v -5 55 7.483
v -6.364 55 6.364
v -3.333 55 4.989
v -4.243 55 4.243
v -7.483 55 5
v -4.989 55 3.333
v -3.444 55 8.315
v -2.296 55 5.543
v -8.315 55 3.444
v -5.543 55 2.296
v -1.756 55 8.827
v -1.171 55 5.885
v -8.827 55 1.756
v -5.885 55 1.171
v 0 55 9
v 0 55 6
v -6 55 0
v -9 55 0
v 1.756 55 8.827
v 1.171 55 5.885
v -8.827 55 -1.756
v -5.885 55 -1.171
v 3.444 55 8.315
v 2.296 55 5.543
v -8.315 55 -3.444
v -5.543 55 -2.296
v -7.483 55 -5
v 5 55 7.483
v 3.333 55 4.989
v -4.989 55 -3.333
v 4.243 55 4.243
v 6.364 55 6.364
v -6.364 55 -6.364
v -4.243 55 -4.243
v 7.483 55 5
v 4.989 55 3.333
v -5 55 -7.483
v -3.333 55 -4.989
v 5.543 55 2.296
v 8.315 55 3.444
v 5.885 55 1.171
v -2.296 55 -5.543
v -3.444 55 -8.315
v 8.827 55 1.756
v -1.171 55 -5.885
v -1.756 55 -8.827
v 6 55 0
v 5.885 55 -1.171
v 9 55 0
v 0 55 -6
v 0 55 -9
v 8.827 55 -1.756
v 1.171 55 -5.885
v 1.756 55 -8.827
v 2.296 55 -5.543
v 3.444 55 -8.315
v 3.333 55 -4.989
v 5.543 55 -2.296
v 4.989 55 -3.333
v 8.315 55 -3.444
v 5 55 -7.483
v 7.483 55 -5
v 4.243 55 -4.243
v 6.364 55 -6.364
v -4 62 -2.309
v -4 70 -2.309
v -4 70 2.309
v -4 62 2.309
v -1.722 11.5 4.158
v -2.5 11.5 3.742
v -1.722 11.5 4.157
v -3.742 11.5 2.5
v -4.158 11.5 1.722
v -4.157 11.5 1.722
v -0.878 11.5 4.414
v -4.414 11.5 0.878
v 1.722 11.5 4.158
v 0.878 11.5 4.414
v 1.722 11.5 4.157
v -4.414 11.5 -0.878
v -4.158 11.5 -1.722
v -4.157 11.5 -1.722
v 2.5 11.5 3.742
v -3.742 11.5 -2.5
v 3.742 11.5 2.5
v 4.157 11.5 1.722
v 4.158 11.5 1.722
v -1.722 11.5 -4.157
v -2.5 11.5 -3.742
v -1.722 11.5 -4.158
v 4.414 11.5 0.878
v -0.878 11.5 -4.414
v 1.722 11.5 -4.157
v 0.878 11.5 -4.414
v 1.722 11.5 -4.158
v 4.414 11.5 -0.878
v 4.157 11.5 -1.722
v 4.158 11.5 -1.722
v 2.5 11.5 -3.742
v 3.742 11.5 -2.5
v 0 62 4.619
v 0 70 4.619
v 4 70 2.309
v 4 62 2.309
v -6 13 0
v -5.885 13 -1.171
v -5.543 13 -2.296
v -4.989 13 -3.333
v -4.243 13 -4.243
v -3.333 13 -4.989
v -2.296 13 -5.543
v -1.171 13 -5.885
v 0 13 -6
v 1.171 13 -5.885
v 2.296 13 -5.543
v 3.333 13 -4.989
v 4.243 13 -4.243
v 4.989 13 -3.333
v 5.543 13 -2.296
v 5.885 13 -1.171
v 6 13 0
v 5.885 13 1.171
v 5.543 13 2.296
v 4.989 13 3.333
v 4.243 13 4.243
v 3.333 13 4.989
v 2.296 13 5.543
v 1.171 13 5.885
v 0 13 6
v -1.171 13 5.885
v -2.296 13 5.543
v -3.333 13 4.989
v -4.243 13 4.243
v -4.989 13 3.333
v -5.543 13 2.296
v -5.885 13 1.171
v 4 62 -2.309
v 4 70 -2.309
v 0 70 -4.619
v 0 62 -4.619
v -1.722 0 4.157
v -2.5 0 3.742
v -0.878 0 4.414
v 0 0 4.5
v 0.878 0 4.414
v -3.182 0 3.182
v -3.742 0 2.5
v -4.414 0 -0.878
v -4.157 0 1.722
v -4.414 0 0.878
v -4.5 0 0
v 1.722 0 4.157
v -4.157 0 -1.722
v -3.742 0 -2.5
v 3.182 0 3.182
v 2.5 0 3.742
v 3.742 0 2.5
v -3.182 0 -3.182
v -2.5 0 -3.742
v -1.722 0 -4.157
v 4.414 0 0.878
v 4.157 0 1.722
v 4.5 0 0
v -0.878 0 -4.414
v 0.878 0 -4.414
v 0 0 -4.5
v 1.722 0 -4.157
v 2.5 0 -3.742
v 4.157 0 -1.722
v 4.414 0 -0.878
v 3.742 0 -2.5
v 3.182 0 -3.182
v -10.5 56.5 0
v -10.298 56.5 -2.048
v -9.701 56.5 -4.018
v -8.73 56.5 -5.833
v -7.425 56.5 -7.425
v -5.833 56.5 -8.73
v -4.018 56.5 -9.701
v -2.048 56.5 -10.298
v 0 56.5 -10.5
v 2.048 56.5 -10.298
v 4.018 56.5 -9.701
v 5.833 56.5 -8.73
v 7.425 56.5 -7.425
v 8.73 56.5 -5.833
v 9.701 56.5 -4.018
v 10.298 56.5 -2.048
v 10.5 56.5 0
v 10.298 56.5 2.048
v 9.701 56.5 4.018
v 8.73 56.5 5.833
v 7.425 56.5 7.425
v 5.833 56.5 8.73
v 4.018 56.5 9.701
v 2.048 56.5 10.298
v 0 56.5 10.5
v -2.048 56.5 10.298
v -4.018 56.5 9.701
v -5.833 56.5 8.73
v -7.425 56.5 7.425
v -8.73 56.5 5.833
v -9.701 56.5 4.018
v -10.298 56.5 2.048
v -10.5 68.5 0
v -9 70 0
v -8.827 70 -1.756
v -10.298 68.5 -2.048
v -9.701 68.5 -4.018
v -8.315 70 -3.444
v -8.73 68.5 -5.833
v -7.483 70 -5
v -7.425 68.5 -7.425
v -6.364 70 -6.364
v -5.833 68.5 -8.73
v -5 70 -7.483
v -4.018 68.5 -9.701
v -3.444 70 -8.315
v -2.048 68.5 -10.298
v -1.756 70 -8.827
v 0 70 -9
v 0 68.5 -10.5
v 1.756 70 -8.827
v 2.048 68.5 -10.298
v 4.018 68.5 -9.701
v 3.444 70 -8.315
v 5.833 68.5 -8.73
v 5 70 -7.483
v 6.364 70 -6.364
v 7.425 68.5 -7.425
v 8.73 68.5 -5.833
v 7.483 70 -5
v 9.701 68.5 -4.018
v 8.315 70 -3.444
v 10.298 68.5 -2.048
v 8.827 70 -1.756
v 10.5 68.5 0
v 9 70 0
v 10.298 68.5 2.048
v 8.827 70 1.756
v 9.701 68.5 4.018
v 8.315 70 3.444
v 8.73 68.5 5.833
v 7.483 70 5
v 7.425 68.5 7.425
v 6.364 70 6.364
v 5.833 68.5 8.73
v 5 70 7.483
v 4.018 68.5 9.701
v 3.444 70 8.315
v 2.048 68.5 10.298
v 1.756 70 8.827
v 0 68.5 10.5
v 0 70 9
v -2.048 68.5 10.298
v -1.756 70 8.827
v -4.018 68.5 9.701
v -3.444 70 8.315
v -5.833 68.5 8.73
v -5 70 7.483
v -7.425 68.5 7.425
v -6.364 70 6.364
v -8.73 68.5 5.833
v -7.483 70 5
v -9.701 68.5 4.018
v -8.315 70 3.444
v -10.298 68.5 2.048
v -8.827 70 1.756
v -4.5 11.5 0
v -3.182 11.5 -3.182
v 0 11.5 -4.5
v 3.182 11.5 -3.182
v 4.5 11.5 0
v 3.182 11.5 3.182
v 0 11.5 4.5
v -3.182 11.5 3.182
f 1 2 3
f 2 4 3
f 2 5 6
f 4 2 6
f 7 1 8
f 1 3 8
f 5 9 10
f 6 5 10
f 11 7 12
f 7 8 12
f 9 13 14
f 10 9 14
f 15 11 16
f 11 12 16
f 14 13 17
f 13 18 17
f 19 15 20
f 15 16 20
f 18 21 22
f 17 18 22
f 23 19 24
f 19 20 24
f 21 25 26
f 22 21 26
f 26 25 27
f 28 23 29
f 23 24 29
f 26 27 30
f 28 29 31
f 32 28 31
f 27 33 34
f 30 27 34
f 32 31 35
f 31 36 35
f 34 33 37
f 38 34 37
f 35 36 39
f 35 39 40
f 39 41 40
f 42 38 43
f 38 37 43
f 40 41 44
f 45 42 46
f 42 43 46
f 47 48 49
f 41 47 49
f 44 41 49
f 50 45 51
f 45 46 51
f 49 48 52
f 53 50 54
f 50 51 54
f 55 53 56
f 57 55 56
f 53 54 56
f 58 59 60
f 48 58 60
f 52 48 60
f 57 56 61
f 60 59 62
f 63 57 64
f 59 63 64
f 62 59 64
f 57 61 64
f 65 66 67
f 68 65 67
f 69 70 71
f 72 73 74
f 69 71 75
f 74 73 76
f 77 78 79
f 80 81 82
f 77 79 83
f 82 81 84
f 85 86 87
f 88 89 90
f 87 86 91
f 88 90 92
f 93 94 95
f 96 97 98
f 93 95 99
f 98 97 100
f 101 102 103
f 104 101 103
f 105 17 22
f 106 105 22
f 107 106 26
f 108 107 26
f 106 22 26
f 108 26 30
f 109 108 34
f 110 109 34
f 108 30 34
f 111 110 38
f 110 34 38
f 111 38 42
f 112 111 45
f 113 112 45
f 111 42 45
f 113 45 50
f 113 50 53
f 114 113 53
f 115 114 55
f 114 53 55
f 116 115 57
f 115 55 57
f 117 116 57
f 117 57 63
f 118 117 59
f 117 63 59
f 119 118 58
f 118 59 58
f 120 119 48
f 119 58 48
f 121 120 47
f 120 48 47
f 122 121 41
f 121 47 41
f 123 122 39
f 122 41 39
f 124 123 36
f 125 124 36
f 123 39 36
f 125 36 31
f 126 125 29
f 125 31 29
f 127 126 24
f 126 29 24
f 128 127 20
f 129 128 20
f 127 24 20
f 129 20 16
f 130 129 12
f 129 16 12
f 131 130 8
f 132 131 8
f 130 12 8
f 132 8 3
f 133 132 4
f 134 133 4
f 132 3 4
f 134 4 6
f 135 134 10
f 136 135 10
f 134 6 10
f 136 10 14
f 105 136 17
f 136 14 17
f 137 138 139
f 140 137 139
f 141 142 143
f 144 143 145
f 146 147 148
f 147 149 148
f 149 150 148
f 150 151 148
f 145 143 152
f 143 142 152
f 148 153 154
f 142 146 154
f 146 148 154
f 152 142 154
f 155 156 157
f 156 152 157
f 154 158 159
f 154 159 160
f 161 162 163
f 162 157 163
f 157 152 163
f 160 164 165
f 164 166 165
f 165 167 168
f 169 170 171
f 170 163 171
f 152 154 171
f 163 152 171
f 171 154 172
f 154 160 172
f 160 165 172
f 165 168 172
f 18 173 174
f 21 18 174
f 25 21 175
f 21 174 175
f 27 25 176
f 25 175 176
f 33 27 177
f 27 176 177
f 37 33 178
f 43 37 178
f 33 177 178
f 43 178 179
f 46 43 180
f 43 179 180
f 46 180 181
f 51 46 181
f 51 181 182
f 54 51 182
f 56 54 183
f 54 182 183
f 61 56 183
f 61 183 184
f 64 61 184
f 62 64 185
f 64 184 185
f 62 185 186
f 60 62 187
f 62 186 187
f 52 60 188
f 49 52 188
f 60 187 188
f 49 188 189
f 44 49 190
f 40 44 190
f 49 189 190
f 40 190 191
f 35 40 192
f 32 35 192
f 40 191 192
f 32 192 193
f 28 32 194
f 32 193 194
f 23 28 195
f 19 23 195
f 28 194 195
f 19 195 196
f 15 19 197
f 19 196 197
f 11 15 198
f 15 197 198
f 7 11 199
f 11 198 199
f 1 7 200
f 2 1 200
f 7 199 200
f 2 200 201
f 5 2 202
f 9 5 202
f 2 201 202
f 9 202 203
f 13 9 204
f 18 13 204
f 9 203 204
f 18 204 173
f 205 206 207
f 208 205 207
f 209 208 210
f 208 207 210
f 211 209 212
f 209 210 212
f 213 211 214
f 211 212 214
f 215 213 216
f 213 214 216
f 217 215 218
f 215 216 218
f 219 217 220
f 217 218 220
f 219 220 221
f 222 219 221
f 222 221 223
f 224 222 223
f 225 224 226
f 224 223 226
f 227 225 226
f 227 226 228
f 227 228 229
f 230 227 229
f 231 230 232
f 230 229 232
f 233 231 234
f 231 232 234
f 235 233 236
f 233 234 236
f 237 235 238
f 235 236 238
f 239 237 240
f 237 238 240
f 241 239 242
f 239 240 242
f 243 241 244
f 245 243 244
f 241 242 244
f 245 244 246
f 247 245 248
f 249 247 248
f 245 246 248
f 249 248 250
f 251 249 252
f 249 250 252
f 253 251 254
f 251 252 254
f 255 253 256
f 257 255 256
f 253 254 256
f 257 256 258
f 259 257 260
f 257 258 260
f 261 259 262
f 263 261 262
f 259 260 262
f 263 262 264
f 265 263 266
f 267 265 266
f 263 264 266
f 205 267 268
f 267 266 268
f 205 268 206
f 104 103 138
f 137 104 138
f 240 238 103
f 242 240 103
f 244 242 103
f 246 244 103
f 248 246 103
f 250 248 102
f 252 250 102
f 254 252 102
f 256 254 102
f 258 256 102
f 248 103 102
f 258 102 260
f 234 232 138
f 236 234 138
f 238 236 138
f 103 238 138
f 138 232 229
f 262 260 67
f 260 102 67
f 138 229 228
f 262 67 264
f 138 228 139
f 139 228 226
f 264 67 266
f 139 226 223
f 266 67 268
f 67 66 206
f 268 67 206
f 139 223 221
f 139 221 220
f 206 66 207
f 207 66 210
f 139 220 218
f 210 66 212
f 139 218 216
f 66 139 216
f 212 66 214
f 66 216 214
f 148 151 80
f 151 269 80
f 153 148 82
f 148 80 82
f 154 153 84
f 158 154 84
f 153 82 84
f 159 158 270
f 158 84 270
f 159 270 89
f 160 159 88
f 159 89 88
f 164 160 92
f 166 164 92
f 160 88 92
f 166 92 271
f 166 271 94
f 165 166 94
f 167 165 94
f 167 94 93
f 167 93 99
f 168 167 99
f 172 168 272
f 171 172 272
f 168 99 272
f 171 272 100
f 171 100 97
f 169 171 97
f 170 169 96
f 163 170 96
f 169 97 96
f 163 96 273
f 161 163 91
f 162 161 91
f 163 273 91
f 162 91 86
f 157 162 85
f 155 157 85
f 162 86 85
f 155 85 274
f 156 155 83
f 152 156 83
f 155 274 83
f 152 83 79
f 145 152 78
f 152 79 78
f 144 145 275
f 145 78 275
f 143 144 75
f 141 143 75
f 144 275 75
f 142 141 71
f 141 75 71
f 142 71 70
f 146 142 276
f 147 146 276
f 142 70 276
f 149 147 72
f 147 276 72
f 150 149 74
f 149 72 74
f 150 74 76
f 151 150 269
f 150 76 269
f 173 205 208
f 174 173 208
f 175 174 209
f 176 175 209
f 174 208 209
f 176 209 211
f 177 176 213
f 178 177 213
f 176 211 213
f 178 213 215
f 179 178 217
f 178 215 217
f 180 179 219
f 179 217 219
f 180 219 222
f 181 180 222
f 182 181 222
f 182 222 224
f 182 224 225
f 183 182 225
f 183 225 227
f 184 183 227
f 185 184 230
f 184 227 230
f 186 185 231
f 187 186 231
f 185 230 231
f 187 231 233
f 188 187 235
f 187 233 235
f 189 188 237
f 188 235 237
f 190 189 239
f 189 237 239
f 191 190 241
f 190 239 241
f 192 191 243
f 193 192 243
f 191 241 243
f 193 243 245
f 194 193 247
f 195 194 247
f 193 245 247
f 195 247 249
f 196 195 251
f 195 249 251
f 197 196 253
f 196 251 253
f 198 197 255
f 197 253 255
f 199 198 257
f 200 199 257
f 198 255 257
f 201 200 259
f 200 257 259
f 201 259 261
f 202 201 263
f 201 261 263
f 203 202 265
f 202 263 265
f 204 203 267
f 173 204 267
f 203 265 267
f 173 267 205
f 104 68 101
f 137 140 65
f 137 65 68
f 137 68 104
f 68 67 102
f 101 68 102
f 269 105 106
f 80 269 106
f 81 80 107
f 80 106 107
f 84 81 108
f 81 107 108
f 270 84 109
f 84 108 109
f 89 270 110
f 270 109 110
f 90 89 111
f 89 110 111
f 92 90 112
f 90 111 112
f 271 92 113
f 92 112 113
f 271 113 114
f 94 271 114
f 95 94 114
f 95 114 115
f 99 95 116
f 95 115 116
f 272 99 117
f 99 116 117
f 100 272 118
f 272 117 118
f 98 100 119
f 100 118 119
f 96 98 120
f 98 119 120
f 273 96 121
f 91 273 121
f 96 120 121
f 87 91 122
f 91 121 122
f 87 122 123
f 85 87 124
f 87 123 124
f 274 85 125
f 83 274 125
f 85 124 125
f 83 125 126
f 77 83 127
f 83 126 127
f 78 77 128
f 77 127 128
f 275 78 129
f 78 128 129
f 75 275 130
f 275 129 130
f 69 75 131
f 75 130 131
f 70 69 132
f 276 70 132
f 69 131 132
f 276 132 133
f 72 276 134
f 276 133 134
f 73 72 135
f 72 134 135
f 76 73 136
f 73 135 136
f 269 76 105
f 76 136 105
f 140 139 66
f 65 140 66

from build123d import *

# Parameters (mm, degrees)
CHAMFER1_SIZE      = 1.5
CUT_EXTRUDE1_DEPTH = 8


with BuildPart() as part:
    # Sketch1 → Revolve1 (revolve)
    with BuildSketch(Plane.XY, mode=Mode.PRIVATE) as revolve1_sk:
        Polygon((0, 0), (4.5, 0), (4.5, 11.5), (6, 11.5), (6, 55), (10.5, 55), (10.5, 70), (0, 70), align=None)
    revolve(revolve1_sk.sketch.rotate(Axis((0, 70, 0), (0, -1, 0)), 180), axis=Axis((0, 70, 0), (0, -1, 0)))

    # Chamfer1
    chamfer1_edges = [part.edges().sort_by_distance(p)[0] for p in [
        (10.5, 70, 0),
        (10.5, 55, 0),
        (6, 11.5, 0),
    ]]
    chamfer(chamfer1_edges, length=CHAMFER1_SIZE - 0.0001)  # a hair under: the kernel refuses the full size

    # Sketch2 → Cut-Extrude1 (cut)
    with BuildSketch(Plane(origin=(0, 70, 0), x_dir=(1, 0, 0), z_dir=(0, 1, 0))):
        Polygon((0, 4.618802154), (-4, 2.309401077), (-4, -2.309401077), (0, -4.618802154), (4, -2.309401077), (4, 2.309401077), align=None)
    extrude(amount=-CUT_EXTRUDE1_DEPTH, mode=Mode.SUBTRACT)


solid = part.part
